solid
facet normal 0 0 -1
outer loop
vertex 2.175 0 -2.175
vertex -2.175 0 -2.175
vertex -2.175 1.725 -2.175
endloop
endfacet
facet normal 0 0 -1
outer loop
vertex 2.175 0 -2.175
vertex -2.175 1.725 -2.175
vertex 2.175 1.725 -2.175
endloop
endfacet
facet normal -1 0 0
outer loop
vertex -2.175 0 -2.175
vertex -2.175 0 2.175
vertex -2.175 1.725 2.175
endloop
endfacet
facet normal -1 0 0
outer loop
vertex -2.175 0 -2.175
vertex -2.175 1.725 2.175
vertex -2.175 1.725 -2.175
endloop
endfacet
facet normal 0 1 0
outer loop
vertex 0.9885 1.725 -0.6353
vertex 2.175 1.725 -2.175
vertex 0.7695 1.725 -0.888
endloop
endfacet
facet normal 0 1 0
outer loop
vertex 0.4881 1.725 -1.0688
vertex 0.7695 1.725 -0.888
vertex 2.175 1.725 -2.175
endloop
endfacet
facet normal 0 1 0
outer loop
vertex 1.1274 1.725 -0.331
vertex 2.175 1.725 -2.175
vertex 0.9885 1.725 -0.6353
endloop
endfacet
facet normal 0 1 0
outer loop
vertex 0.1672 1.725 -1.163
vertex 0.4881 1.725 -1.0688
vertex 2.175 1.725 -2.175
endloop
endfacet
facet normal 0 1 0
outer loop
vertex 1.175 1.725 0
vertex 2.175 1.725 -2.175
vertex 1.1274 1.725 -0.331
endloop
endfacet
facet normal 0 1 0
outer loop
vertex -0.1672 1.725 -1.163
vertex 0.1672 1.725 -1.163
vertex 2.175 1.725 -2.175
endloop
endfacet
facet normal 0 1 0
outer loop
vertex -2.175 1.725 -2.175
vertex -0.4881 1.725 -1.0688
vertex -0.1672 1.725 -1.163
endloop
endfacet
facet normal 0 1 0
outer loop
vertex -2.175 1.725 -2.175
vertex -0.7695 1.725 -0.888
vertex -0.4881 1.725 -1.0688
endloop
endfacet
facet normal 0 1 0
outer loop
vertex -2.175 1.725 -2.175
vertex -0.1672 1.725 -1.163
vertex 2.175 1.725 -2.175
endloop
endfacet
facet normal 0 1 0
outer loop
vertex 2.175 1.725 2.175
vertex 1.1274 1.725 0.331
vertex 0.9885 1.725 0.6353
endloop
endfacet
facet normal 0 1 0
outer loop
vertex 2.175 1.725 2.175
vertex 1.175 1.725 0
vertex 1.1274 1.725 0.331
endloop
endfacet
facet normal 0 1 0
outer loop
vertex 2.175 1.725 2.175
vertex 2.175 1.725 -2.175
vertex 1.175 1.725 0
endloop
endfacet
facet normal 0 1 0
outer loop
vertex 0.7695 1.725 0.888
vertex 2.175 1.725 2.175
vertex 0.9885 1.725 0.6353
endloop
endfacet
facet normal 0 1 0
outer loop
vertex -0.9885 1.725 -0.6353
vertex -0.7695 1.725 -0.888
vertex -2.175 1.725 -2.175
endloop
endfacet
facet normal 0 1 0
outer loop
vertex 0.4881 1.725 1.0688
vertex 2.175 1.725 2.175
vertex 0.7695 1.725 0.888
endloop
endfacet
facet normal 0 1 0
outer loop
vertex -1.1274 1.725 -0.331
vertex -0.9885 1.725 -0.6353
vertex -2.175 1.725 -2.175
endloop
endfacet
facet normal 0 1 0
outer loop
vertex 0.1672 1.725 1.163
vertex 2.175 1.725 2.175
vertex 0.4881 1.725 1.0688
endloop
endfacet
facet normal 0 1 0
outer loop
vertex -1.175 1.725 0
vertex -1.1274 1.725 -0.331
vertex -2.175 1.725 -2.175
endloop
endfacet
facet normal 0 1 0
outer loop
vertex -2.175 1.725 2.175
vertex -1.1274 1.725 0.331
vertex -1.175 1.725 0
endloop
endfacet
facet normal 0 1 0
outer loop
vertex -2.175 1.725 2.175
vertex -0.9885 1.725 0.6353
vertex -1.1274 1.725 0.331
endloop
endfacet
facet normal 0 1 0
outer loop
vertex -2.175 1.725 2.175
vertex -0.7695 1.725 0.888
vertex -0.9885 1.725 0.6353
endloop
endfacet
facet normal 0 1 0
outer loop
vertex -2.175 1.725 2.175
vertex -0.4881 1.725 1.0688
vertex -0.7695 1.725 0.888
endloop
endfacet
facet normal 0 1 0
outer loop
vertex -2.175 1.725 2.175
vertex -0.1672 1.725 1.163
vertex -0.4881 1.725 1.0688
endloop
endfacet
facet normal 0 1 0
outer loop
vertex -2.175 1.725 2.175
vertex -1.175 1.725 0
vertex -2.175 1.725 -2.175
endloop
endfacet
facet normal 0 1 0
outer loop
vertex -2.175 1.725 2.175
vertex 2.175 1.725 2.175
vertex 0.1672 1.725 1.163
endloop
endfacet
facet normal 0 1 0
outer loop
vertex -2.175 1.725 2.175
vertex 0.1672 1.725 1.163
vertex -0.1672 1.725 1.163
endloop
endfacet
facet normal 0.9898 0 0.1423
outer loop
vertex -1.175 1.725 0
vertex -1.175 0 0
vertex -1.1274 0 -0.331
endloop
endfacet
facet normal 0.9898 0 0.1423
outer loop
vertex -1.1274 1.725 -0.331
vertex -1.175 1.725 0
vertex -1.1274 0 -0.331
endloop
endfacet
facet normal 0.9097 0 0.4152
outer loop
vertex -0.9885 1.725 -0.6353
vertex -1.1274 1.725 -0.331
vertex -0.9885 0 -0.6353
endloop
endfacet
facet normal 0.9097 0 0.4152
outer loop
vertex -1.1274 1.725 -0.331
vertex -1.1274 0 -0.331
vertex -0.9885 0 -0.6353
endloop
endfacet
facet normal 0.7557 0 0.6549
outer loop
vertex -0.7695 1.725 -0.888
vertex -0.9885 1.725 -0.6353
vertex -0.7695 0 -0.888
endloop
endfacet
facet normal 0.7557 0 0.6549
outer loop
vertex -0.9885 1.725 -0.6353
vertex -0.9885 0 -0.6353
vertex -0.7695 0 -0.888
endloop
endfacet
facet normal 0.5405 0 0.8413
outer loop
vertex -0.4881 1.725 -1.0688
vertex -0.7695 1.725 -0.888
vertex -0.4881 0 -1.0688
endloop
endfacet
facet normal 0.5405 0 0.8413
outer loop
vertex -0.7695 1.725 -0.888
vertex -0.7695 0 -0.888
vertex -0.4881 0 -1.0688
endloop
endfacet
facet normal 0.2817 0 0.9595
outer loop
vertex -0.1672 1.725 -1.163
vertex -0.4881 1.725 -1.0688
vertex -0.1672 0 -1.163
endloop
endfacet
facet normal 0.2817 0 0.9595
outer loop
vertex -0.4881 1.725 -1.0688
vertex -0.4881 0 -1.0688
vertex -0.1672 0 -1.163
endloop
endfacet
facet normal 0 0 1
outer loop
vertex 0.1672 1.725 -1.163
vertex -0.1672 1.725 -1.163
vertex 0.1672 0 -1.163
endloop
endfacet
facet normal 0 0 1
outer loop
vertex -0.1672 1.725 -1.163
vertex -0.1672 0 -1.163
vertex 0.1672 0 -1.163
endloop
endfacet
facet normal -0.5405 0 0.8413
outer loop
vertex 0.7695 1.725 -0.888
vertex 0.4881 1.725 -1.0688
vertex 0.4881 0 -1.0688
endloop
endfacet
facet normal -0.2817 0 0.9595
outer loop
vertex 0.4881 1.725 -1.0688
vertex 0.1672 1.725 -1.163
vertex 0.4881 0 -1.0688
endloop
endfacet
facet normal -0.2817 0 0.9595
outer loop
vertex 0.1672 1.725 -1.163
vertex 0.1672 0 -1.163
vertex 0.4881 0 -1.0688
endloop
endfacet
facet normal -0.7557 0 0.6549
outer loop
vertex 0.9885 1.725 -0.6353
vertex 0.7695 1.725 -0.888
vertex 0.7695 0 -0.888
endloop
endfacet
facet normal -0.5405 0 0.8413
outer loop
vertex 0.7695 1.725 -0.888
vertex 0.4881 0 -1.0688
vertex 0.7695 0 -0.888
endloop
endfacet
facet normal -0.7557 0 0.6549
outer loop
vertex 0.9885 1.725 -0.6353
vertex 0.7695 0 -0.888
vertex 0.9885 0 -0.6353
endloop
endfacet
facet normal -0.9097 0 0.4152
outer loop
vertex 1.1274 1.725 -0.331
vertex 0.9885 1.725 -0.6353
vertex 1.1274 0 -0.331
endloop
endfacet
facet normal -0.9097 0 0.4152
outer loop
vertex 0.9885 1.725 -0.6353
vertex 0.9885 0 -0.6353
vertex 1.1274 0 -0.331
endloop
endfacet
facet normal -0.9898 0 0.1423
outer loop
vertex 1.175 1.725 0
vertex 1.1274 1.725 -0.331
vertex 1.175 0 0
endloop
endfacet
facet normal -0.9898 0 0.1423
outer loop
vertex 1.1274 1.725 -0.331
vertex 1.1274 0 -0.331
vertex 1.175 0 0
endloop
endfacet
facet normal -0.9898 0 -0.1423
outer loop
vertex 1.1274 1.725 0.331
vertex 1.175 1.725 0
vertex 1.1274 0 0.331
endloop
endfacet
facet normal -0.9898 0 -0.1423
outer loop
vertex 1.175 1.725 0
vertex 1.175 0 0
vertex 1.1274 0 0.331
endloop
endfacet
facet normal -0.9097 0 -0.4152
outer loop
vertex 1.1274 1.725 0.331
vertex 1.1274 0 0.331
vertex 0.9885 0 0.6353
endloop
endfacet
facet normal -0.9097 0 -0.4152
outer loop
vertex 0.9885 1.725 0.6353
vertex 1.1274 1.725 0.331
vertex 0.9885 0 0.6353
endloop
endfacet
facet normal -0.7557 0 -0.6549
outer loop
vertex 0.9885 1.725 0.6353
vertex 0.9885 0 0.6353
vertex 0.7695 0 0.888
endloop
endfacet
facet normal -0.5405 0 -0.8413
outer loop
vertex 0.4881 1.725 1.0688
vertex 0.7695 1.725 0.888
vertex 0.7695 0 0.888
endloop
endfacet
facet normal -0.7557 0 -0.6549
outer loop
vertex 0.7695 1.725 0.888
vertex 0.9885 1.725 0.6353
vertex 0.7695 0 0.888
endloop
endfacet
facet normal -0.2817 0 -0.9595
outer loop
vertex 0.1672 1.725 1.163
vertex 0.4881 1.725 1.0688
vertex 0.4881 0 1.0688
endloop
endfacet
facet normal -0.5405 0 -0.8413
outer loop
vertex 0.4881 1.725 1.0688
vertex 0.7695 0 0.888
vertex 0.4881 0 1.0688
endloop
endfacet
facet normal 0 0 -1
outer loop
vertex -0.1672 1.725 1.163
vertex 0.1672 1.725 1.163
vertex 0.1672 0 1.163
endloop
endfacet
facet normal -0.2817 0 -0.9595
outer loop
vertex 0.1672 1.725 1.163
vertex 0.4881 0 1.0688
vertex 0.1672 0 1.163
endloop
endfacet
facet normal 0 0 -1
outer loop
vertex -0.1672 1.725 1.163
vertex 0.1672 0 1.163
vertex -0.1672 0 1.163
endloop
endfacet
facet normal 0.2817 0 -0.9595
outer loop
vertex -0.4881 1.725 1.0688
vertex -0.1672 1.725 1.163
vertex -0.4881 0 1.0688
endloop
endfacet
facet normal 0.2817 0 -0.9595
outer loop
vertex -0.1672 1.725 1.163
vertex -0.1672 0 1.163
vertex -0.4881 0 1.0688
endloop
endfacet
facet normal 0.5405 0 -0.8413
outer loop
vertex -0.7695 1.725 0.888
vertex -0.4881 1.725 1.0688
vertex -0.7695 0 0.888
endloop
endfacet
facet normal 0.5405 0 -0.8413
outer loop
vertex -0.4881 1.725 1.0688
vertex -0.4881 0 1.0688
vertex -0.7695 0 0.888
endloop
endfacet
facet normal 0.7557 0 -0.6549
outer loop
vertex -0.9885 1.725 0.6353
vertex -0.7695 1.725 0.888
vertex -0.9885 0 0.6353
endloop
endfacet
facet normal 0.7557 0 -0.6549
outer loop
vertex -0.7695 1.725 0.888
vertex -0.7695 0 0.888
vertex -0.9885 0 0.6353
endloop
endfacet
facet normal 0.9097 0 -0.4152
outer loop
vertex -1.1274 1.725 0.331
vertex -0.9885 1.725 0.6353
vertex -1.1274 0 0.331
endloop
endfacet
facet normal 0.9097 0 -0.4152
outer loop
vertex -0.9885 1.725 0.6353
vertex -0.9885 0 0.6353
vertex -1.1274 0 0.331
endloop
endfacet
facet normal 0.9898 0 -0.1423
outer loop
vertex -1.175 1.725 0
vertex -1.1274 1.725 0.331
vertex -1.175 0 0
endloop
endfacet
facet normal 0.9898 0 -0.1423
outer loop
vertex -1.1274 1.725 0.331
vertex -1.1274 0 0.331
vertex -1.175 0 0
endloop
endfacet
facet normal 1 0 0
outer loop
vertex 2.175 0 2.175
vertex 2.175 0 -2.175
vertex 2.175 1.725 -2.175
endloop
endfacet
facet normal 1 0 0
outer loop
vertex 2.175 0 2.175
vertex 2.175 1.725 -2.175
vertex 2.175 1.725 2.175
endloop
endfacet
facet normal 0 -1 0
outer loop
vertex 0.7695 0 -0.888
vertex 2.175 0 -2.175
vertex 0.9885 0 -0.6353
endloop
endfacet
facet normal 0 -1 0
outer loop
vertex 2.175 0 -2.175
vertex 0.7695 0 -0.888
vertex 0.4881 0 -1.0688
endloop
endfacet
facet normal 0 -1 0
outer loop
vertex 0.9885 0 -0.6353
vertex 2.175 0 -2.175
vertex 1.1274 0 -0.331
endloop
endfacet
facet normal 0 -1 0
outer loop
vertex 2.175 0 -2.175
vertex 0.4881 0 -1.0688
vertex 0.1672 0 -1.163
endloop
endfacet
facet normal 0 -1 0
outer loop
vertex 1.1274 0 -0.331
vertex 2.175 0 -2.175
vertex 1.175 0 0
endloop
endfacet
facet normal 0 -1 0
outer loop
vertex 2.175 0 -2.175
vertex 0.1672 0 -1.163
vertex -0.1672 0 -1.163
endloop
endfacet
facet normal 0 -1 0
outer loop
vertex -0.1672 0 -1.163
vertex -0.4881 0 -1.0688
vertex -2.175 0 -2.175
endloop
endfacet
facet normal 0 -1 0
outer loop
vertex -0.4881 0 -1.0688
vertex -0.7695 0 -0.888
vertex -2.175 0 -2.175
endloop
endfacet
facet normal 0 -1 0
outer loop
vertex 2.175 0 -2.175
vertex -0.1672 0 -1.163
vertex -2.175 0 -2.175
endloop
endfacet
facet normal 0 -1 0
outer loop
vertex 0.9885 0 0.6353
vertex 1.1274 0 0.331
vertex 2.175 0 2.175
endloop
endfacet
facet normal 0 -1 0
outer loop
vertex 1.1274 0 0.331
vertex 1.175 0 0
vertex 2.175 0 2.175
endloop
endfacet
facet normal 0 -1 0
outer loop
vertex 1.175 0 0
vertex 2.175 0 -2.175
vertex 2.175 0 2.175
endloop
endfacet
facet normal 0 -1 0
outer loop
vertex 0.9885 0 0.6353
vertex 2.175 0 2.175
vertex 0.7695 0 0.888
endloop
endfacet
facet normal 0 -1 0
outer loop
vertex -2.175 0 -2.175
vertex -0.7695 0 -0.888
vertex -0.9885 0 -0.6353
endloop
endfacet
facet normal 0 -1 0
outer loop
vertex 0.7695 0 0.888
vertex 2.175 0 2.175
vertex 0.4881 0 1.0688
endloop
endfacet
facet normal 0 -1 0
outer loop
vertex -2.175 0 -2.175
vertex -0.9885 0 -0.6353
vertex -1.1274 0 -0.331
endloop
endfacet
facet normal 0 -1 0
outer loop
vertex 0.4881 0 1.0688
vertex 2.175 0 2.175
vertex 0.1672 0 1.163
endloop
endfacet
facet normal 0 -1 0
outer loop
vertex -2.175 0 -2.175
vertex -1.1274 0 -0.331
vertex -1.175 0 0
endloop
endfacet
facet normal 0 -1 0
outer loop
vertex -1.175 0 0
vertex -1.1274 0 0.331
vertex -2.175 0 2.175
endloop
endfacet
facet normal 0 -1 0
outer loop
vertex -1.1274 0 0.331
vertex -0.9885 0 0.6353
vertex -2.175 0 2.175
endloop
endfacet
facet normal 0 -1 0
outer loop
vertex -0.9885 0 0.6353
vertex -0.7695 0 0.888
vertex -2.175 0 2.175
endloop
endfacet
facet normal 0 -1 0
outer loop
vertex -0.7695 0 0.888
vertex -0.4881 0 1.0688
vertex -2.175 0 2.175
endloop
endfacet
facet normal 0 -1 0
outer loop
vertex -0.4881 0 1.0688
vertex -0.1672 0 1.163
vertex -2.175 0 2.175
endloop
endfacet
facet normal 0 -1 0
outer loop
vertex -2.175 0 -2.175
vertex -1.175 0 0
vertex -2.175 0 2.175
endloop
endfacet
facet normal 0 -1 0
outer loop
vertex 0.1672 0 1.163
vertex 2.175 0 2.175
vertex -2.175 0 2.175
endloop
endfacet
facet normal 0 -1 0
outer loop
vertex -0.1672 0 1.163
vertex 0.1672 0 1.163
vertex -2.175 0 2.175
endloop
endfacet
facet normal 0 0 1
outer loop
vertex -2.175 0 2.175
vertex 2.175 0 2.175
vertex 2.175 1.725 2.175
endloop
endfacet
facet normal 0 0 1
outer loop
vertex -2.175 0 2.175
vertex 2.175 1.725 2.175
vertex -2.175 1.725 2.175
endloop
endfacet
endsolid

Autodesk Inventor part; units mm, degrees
ref_plane "YZ Plane" through (0, 0, 0) normal (1, 0, 0) x (0, 1, 0)
ref_plane "XZ Plane" through (0, 0, 0) normal (0, 1, 0) x (-1, 0, 0)
ref_plane "XY Plane" through (0, 0, 0) normal (0, 0, 1) x (1, 0, 0)
sketch "Sketch1" plane through (0, 0, 0) normal (0, 1, 0) x (-1, 0, 0)
  line L0 (-2.175, 2.175) -> (2.175, 2.175)
  line L1 (2.175, 2.175) -> (2.175, -2.175)
  line L2 (2.175, -2.175) -> (-2.175, -2.175)
  line L3 (-2.175, -2.175) -> (-2.175, 2.175)
  circle A0 centre (0, 0) radius 1.175
  point P0 (0, 2.175)
  point P1 (2.175, 0)
  dimension "d0" = 4.35
  dimension "d1" = 2.35
extrude "Extrusion1" add sketch "Sketch1" along normal blind 1.725
equation "\"d0\" = nut_A"
equation "\"d1\" = nut_C"
equation "\"d2\" = nut_B"
equation "\"nut_A\" = 4.35"
equation "\"nut_C\" = 2.35"
equation "\"nut_B\" = 1.725"
properties part number "NUT_2MM"
